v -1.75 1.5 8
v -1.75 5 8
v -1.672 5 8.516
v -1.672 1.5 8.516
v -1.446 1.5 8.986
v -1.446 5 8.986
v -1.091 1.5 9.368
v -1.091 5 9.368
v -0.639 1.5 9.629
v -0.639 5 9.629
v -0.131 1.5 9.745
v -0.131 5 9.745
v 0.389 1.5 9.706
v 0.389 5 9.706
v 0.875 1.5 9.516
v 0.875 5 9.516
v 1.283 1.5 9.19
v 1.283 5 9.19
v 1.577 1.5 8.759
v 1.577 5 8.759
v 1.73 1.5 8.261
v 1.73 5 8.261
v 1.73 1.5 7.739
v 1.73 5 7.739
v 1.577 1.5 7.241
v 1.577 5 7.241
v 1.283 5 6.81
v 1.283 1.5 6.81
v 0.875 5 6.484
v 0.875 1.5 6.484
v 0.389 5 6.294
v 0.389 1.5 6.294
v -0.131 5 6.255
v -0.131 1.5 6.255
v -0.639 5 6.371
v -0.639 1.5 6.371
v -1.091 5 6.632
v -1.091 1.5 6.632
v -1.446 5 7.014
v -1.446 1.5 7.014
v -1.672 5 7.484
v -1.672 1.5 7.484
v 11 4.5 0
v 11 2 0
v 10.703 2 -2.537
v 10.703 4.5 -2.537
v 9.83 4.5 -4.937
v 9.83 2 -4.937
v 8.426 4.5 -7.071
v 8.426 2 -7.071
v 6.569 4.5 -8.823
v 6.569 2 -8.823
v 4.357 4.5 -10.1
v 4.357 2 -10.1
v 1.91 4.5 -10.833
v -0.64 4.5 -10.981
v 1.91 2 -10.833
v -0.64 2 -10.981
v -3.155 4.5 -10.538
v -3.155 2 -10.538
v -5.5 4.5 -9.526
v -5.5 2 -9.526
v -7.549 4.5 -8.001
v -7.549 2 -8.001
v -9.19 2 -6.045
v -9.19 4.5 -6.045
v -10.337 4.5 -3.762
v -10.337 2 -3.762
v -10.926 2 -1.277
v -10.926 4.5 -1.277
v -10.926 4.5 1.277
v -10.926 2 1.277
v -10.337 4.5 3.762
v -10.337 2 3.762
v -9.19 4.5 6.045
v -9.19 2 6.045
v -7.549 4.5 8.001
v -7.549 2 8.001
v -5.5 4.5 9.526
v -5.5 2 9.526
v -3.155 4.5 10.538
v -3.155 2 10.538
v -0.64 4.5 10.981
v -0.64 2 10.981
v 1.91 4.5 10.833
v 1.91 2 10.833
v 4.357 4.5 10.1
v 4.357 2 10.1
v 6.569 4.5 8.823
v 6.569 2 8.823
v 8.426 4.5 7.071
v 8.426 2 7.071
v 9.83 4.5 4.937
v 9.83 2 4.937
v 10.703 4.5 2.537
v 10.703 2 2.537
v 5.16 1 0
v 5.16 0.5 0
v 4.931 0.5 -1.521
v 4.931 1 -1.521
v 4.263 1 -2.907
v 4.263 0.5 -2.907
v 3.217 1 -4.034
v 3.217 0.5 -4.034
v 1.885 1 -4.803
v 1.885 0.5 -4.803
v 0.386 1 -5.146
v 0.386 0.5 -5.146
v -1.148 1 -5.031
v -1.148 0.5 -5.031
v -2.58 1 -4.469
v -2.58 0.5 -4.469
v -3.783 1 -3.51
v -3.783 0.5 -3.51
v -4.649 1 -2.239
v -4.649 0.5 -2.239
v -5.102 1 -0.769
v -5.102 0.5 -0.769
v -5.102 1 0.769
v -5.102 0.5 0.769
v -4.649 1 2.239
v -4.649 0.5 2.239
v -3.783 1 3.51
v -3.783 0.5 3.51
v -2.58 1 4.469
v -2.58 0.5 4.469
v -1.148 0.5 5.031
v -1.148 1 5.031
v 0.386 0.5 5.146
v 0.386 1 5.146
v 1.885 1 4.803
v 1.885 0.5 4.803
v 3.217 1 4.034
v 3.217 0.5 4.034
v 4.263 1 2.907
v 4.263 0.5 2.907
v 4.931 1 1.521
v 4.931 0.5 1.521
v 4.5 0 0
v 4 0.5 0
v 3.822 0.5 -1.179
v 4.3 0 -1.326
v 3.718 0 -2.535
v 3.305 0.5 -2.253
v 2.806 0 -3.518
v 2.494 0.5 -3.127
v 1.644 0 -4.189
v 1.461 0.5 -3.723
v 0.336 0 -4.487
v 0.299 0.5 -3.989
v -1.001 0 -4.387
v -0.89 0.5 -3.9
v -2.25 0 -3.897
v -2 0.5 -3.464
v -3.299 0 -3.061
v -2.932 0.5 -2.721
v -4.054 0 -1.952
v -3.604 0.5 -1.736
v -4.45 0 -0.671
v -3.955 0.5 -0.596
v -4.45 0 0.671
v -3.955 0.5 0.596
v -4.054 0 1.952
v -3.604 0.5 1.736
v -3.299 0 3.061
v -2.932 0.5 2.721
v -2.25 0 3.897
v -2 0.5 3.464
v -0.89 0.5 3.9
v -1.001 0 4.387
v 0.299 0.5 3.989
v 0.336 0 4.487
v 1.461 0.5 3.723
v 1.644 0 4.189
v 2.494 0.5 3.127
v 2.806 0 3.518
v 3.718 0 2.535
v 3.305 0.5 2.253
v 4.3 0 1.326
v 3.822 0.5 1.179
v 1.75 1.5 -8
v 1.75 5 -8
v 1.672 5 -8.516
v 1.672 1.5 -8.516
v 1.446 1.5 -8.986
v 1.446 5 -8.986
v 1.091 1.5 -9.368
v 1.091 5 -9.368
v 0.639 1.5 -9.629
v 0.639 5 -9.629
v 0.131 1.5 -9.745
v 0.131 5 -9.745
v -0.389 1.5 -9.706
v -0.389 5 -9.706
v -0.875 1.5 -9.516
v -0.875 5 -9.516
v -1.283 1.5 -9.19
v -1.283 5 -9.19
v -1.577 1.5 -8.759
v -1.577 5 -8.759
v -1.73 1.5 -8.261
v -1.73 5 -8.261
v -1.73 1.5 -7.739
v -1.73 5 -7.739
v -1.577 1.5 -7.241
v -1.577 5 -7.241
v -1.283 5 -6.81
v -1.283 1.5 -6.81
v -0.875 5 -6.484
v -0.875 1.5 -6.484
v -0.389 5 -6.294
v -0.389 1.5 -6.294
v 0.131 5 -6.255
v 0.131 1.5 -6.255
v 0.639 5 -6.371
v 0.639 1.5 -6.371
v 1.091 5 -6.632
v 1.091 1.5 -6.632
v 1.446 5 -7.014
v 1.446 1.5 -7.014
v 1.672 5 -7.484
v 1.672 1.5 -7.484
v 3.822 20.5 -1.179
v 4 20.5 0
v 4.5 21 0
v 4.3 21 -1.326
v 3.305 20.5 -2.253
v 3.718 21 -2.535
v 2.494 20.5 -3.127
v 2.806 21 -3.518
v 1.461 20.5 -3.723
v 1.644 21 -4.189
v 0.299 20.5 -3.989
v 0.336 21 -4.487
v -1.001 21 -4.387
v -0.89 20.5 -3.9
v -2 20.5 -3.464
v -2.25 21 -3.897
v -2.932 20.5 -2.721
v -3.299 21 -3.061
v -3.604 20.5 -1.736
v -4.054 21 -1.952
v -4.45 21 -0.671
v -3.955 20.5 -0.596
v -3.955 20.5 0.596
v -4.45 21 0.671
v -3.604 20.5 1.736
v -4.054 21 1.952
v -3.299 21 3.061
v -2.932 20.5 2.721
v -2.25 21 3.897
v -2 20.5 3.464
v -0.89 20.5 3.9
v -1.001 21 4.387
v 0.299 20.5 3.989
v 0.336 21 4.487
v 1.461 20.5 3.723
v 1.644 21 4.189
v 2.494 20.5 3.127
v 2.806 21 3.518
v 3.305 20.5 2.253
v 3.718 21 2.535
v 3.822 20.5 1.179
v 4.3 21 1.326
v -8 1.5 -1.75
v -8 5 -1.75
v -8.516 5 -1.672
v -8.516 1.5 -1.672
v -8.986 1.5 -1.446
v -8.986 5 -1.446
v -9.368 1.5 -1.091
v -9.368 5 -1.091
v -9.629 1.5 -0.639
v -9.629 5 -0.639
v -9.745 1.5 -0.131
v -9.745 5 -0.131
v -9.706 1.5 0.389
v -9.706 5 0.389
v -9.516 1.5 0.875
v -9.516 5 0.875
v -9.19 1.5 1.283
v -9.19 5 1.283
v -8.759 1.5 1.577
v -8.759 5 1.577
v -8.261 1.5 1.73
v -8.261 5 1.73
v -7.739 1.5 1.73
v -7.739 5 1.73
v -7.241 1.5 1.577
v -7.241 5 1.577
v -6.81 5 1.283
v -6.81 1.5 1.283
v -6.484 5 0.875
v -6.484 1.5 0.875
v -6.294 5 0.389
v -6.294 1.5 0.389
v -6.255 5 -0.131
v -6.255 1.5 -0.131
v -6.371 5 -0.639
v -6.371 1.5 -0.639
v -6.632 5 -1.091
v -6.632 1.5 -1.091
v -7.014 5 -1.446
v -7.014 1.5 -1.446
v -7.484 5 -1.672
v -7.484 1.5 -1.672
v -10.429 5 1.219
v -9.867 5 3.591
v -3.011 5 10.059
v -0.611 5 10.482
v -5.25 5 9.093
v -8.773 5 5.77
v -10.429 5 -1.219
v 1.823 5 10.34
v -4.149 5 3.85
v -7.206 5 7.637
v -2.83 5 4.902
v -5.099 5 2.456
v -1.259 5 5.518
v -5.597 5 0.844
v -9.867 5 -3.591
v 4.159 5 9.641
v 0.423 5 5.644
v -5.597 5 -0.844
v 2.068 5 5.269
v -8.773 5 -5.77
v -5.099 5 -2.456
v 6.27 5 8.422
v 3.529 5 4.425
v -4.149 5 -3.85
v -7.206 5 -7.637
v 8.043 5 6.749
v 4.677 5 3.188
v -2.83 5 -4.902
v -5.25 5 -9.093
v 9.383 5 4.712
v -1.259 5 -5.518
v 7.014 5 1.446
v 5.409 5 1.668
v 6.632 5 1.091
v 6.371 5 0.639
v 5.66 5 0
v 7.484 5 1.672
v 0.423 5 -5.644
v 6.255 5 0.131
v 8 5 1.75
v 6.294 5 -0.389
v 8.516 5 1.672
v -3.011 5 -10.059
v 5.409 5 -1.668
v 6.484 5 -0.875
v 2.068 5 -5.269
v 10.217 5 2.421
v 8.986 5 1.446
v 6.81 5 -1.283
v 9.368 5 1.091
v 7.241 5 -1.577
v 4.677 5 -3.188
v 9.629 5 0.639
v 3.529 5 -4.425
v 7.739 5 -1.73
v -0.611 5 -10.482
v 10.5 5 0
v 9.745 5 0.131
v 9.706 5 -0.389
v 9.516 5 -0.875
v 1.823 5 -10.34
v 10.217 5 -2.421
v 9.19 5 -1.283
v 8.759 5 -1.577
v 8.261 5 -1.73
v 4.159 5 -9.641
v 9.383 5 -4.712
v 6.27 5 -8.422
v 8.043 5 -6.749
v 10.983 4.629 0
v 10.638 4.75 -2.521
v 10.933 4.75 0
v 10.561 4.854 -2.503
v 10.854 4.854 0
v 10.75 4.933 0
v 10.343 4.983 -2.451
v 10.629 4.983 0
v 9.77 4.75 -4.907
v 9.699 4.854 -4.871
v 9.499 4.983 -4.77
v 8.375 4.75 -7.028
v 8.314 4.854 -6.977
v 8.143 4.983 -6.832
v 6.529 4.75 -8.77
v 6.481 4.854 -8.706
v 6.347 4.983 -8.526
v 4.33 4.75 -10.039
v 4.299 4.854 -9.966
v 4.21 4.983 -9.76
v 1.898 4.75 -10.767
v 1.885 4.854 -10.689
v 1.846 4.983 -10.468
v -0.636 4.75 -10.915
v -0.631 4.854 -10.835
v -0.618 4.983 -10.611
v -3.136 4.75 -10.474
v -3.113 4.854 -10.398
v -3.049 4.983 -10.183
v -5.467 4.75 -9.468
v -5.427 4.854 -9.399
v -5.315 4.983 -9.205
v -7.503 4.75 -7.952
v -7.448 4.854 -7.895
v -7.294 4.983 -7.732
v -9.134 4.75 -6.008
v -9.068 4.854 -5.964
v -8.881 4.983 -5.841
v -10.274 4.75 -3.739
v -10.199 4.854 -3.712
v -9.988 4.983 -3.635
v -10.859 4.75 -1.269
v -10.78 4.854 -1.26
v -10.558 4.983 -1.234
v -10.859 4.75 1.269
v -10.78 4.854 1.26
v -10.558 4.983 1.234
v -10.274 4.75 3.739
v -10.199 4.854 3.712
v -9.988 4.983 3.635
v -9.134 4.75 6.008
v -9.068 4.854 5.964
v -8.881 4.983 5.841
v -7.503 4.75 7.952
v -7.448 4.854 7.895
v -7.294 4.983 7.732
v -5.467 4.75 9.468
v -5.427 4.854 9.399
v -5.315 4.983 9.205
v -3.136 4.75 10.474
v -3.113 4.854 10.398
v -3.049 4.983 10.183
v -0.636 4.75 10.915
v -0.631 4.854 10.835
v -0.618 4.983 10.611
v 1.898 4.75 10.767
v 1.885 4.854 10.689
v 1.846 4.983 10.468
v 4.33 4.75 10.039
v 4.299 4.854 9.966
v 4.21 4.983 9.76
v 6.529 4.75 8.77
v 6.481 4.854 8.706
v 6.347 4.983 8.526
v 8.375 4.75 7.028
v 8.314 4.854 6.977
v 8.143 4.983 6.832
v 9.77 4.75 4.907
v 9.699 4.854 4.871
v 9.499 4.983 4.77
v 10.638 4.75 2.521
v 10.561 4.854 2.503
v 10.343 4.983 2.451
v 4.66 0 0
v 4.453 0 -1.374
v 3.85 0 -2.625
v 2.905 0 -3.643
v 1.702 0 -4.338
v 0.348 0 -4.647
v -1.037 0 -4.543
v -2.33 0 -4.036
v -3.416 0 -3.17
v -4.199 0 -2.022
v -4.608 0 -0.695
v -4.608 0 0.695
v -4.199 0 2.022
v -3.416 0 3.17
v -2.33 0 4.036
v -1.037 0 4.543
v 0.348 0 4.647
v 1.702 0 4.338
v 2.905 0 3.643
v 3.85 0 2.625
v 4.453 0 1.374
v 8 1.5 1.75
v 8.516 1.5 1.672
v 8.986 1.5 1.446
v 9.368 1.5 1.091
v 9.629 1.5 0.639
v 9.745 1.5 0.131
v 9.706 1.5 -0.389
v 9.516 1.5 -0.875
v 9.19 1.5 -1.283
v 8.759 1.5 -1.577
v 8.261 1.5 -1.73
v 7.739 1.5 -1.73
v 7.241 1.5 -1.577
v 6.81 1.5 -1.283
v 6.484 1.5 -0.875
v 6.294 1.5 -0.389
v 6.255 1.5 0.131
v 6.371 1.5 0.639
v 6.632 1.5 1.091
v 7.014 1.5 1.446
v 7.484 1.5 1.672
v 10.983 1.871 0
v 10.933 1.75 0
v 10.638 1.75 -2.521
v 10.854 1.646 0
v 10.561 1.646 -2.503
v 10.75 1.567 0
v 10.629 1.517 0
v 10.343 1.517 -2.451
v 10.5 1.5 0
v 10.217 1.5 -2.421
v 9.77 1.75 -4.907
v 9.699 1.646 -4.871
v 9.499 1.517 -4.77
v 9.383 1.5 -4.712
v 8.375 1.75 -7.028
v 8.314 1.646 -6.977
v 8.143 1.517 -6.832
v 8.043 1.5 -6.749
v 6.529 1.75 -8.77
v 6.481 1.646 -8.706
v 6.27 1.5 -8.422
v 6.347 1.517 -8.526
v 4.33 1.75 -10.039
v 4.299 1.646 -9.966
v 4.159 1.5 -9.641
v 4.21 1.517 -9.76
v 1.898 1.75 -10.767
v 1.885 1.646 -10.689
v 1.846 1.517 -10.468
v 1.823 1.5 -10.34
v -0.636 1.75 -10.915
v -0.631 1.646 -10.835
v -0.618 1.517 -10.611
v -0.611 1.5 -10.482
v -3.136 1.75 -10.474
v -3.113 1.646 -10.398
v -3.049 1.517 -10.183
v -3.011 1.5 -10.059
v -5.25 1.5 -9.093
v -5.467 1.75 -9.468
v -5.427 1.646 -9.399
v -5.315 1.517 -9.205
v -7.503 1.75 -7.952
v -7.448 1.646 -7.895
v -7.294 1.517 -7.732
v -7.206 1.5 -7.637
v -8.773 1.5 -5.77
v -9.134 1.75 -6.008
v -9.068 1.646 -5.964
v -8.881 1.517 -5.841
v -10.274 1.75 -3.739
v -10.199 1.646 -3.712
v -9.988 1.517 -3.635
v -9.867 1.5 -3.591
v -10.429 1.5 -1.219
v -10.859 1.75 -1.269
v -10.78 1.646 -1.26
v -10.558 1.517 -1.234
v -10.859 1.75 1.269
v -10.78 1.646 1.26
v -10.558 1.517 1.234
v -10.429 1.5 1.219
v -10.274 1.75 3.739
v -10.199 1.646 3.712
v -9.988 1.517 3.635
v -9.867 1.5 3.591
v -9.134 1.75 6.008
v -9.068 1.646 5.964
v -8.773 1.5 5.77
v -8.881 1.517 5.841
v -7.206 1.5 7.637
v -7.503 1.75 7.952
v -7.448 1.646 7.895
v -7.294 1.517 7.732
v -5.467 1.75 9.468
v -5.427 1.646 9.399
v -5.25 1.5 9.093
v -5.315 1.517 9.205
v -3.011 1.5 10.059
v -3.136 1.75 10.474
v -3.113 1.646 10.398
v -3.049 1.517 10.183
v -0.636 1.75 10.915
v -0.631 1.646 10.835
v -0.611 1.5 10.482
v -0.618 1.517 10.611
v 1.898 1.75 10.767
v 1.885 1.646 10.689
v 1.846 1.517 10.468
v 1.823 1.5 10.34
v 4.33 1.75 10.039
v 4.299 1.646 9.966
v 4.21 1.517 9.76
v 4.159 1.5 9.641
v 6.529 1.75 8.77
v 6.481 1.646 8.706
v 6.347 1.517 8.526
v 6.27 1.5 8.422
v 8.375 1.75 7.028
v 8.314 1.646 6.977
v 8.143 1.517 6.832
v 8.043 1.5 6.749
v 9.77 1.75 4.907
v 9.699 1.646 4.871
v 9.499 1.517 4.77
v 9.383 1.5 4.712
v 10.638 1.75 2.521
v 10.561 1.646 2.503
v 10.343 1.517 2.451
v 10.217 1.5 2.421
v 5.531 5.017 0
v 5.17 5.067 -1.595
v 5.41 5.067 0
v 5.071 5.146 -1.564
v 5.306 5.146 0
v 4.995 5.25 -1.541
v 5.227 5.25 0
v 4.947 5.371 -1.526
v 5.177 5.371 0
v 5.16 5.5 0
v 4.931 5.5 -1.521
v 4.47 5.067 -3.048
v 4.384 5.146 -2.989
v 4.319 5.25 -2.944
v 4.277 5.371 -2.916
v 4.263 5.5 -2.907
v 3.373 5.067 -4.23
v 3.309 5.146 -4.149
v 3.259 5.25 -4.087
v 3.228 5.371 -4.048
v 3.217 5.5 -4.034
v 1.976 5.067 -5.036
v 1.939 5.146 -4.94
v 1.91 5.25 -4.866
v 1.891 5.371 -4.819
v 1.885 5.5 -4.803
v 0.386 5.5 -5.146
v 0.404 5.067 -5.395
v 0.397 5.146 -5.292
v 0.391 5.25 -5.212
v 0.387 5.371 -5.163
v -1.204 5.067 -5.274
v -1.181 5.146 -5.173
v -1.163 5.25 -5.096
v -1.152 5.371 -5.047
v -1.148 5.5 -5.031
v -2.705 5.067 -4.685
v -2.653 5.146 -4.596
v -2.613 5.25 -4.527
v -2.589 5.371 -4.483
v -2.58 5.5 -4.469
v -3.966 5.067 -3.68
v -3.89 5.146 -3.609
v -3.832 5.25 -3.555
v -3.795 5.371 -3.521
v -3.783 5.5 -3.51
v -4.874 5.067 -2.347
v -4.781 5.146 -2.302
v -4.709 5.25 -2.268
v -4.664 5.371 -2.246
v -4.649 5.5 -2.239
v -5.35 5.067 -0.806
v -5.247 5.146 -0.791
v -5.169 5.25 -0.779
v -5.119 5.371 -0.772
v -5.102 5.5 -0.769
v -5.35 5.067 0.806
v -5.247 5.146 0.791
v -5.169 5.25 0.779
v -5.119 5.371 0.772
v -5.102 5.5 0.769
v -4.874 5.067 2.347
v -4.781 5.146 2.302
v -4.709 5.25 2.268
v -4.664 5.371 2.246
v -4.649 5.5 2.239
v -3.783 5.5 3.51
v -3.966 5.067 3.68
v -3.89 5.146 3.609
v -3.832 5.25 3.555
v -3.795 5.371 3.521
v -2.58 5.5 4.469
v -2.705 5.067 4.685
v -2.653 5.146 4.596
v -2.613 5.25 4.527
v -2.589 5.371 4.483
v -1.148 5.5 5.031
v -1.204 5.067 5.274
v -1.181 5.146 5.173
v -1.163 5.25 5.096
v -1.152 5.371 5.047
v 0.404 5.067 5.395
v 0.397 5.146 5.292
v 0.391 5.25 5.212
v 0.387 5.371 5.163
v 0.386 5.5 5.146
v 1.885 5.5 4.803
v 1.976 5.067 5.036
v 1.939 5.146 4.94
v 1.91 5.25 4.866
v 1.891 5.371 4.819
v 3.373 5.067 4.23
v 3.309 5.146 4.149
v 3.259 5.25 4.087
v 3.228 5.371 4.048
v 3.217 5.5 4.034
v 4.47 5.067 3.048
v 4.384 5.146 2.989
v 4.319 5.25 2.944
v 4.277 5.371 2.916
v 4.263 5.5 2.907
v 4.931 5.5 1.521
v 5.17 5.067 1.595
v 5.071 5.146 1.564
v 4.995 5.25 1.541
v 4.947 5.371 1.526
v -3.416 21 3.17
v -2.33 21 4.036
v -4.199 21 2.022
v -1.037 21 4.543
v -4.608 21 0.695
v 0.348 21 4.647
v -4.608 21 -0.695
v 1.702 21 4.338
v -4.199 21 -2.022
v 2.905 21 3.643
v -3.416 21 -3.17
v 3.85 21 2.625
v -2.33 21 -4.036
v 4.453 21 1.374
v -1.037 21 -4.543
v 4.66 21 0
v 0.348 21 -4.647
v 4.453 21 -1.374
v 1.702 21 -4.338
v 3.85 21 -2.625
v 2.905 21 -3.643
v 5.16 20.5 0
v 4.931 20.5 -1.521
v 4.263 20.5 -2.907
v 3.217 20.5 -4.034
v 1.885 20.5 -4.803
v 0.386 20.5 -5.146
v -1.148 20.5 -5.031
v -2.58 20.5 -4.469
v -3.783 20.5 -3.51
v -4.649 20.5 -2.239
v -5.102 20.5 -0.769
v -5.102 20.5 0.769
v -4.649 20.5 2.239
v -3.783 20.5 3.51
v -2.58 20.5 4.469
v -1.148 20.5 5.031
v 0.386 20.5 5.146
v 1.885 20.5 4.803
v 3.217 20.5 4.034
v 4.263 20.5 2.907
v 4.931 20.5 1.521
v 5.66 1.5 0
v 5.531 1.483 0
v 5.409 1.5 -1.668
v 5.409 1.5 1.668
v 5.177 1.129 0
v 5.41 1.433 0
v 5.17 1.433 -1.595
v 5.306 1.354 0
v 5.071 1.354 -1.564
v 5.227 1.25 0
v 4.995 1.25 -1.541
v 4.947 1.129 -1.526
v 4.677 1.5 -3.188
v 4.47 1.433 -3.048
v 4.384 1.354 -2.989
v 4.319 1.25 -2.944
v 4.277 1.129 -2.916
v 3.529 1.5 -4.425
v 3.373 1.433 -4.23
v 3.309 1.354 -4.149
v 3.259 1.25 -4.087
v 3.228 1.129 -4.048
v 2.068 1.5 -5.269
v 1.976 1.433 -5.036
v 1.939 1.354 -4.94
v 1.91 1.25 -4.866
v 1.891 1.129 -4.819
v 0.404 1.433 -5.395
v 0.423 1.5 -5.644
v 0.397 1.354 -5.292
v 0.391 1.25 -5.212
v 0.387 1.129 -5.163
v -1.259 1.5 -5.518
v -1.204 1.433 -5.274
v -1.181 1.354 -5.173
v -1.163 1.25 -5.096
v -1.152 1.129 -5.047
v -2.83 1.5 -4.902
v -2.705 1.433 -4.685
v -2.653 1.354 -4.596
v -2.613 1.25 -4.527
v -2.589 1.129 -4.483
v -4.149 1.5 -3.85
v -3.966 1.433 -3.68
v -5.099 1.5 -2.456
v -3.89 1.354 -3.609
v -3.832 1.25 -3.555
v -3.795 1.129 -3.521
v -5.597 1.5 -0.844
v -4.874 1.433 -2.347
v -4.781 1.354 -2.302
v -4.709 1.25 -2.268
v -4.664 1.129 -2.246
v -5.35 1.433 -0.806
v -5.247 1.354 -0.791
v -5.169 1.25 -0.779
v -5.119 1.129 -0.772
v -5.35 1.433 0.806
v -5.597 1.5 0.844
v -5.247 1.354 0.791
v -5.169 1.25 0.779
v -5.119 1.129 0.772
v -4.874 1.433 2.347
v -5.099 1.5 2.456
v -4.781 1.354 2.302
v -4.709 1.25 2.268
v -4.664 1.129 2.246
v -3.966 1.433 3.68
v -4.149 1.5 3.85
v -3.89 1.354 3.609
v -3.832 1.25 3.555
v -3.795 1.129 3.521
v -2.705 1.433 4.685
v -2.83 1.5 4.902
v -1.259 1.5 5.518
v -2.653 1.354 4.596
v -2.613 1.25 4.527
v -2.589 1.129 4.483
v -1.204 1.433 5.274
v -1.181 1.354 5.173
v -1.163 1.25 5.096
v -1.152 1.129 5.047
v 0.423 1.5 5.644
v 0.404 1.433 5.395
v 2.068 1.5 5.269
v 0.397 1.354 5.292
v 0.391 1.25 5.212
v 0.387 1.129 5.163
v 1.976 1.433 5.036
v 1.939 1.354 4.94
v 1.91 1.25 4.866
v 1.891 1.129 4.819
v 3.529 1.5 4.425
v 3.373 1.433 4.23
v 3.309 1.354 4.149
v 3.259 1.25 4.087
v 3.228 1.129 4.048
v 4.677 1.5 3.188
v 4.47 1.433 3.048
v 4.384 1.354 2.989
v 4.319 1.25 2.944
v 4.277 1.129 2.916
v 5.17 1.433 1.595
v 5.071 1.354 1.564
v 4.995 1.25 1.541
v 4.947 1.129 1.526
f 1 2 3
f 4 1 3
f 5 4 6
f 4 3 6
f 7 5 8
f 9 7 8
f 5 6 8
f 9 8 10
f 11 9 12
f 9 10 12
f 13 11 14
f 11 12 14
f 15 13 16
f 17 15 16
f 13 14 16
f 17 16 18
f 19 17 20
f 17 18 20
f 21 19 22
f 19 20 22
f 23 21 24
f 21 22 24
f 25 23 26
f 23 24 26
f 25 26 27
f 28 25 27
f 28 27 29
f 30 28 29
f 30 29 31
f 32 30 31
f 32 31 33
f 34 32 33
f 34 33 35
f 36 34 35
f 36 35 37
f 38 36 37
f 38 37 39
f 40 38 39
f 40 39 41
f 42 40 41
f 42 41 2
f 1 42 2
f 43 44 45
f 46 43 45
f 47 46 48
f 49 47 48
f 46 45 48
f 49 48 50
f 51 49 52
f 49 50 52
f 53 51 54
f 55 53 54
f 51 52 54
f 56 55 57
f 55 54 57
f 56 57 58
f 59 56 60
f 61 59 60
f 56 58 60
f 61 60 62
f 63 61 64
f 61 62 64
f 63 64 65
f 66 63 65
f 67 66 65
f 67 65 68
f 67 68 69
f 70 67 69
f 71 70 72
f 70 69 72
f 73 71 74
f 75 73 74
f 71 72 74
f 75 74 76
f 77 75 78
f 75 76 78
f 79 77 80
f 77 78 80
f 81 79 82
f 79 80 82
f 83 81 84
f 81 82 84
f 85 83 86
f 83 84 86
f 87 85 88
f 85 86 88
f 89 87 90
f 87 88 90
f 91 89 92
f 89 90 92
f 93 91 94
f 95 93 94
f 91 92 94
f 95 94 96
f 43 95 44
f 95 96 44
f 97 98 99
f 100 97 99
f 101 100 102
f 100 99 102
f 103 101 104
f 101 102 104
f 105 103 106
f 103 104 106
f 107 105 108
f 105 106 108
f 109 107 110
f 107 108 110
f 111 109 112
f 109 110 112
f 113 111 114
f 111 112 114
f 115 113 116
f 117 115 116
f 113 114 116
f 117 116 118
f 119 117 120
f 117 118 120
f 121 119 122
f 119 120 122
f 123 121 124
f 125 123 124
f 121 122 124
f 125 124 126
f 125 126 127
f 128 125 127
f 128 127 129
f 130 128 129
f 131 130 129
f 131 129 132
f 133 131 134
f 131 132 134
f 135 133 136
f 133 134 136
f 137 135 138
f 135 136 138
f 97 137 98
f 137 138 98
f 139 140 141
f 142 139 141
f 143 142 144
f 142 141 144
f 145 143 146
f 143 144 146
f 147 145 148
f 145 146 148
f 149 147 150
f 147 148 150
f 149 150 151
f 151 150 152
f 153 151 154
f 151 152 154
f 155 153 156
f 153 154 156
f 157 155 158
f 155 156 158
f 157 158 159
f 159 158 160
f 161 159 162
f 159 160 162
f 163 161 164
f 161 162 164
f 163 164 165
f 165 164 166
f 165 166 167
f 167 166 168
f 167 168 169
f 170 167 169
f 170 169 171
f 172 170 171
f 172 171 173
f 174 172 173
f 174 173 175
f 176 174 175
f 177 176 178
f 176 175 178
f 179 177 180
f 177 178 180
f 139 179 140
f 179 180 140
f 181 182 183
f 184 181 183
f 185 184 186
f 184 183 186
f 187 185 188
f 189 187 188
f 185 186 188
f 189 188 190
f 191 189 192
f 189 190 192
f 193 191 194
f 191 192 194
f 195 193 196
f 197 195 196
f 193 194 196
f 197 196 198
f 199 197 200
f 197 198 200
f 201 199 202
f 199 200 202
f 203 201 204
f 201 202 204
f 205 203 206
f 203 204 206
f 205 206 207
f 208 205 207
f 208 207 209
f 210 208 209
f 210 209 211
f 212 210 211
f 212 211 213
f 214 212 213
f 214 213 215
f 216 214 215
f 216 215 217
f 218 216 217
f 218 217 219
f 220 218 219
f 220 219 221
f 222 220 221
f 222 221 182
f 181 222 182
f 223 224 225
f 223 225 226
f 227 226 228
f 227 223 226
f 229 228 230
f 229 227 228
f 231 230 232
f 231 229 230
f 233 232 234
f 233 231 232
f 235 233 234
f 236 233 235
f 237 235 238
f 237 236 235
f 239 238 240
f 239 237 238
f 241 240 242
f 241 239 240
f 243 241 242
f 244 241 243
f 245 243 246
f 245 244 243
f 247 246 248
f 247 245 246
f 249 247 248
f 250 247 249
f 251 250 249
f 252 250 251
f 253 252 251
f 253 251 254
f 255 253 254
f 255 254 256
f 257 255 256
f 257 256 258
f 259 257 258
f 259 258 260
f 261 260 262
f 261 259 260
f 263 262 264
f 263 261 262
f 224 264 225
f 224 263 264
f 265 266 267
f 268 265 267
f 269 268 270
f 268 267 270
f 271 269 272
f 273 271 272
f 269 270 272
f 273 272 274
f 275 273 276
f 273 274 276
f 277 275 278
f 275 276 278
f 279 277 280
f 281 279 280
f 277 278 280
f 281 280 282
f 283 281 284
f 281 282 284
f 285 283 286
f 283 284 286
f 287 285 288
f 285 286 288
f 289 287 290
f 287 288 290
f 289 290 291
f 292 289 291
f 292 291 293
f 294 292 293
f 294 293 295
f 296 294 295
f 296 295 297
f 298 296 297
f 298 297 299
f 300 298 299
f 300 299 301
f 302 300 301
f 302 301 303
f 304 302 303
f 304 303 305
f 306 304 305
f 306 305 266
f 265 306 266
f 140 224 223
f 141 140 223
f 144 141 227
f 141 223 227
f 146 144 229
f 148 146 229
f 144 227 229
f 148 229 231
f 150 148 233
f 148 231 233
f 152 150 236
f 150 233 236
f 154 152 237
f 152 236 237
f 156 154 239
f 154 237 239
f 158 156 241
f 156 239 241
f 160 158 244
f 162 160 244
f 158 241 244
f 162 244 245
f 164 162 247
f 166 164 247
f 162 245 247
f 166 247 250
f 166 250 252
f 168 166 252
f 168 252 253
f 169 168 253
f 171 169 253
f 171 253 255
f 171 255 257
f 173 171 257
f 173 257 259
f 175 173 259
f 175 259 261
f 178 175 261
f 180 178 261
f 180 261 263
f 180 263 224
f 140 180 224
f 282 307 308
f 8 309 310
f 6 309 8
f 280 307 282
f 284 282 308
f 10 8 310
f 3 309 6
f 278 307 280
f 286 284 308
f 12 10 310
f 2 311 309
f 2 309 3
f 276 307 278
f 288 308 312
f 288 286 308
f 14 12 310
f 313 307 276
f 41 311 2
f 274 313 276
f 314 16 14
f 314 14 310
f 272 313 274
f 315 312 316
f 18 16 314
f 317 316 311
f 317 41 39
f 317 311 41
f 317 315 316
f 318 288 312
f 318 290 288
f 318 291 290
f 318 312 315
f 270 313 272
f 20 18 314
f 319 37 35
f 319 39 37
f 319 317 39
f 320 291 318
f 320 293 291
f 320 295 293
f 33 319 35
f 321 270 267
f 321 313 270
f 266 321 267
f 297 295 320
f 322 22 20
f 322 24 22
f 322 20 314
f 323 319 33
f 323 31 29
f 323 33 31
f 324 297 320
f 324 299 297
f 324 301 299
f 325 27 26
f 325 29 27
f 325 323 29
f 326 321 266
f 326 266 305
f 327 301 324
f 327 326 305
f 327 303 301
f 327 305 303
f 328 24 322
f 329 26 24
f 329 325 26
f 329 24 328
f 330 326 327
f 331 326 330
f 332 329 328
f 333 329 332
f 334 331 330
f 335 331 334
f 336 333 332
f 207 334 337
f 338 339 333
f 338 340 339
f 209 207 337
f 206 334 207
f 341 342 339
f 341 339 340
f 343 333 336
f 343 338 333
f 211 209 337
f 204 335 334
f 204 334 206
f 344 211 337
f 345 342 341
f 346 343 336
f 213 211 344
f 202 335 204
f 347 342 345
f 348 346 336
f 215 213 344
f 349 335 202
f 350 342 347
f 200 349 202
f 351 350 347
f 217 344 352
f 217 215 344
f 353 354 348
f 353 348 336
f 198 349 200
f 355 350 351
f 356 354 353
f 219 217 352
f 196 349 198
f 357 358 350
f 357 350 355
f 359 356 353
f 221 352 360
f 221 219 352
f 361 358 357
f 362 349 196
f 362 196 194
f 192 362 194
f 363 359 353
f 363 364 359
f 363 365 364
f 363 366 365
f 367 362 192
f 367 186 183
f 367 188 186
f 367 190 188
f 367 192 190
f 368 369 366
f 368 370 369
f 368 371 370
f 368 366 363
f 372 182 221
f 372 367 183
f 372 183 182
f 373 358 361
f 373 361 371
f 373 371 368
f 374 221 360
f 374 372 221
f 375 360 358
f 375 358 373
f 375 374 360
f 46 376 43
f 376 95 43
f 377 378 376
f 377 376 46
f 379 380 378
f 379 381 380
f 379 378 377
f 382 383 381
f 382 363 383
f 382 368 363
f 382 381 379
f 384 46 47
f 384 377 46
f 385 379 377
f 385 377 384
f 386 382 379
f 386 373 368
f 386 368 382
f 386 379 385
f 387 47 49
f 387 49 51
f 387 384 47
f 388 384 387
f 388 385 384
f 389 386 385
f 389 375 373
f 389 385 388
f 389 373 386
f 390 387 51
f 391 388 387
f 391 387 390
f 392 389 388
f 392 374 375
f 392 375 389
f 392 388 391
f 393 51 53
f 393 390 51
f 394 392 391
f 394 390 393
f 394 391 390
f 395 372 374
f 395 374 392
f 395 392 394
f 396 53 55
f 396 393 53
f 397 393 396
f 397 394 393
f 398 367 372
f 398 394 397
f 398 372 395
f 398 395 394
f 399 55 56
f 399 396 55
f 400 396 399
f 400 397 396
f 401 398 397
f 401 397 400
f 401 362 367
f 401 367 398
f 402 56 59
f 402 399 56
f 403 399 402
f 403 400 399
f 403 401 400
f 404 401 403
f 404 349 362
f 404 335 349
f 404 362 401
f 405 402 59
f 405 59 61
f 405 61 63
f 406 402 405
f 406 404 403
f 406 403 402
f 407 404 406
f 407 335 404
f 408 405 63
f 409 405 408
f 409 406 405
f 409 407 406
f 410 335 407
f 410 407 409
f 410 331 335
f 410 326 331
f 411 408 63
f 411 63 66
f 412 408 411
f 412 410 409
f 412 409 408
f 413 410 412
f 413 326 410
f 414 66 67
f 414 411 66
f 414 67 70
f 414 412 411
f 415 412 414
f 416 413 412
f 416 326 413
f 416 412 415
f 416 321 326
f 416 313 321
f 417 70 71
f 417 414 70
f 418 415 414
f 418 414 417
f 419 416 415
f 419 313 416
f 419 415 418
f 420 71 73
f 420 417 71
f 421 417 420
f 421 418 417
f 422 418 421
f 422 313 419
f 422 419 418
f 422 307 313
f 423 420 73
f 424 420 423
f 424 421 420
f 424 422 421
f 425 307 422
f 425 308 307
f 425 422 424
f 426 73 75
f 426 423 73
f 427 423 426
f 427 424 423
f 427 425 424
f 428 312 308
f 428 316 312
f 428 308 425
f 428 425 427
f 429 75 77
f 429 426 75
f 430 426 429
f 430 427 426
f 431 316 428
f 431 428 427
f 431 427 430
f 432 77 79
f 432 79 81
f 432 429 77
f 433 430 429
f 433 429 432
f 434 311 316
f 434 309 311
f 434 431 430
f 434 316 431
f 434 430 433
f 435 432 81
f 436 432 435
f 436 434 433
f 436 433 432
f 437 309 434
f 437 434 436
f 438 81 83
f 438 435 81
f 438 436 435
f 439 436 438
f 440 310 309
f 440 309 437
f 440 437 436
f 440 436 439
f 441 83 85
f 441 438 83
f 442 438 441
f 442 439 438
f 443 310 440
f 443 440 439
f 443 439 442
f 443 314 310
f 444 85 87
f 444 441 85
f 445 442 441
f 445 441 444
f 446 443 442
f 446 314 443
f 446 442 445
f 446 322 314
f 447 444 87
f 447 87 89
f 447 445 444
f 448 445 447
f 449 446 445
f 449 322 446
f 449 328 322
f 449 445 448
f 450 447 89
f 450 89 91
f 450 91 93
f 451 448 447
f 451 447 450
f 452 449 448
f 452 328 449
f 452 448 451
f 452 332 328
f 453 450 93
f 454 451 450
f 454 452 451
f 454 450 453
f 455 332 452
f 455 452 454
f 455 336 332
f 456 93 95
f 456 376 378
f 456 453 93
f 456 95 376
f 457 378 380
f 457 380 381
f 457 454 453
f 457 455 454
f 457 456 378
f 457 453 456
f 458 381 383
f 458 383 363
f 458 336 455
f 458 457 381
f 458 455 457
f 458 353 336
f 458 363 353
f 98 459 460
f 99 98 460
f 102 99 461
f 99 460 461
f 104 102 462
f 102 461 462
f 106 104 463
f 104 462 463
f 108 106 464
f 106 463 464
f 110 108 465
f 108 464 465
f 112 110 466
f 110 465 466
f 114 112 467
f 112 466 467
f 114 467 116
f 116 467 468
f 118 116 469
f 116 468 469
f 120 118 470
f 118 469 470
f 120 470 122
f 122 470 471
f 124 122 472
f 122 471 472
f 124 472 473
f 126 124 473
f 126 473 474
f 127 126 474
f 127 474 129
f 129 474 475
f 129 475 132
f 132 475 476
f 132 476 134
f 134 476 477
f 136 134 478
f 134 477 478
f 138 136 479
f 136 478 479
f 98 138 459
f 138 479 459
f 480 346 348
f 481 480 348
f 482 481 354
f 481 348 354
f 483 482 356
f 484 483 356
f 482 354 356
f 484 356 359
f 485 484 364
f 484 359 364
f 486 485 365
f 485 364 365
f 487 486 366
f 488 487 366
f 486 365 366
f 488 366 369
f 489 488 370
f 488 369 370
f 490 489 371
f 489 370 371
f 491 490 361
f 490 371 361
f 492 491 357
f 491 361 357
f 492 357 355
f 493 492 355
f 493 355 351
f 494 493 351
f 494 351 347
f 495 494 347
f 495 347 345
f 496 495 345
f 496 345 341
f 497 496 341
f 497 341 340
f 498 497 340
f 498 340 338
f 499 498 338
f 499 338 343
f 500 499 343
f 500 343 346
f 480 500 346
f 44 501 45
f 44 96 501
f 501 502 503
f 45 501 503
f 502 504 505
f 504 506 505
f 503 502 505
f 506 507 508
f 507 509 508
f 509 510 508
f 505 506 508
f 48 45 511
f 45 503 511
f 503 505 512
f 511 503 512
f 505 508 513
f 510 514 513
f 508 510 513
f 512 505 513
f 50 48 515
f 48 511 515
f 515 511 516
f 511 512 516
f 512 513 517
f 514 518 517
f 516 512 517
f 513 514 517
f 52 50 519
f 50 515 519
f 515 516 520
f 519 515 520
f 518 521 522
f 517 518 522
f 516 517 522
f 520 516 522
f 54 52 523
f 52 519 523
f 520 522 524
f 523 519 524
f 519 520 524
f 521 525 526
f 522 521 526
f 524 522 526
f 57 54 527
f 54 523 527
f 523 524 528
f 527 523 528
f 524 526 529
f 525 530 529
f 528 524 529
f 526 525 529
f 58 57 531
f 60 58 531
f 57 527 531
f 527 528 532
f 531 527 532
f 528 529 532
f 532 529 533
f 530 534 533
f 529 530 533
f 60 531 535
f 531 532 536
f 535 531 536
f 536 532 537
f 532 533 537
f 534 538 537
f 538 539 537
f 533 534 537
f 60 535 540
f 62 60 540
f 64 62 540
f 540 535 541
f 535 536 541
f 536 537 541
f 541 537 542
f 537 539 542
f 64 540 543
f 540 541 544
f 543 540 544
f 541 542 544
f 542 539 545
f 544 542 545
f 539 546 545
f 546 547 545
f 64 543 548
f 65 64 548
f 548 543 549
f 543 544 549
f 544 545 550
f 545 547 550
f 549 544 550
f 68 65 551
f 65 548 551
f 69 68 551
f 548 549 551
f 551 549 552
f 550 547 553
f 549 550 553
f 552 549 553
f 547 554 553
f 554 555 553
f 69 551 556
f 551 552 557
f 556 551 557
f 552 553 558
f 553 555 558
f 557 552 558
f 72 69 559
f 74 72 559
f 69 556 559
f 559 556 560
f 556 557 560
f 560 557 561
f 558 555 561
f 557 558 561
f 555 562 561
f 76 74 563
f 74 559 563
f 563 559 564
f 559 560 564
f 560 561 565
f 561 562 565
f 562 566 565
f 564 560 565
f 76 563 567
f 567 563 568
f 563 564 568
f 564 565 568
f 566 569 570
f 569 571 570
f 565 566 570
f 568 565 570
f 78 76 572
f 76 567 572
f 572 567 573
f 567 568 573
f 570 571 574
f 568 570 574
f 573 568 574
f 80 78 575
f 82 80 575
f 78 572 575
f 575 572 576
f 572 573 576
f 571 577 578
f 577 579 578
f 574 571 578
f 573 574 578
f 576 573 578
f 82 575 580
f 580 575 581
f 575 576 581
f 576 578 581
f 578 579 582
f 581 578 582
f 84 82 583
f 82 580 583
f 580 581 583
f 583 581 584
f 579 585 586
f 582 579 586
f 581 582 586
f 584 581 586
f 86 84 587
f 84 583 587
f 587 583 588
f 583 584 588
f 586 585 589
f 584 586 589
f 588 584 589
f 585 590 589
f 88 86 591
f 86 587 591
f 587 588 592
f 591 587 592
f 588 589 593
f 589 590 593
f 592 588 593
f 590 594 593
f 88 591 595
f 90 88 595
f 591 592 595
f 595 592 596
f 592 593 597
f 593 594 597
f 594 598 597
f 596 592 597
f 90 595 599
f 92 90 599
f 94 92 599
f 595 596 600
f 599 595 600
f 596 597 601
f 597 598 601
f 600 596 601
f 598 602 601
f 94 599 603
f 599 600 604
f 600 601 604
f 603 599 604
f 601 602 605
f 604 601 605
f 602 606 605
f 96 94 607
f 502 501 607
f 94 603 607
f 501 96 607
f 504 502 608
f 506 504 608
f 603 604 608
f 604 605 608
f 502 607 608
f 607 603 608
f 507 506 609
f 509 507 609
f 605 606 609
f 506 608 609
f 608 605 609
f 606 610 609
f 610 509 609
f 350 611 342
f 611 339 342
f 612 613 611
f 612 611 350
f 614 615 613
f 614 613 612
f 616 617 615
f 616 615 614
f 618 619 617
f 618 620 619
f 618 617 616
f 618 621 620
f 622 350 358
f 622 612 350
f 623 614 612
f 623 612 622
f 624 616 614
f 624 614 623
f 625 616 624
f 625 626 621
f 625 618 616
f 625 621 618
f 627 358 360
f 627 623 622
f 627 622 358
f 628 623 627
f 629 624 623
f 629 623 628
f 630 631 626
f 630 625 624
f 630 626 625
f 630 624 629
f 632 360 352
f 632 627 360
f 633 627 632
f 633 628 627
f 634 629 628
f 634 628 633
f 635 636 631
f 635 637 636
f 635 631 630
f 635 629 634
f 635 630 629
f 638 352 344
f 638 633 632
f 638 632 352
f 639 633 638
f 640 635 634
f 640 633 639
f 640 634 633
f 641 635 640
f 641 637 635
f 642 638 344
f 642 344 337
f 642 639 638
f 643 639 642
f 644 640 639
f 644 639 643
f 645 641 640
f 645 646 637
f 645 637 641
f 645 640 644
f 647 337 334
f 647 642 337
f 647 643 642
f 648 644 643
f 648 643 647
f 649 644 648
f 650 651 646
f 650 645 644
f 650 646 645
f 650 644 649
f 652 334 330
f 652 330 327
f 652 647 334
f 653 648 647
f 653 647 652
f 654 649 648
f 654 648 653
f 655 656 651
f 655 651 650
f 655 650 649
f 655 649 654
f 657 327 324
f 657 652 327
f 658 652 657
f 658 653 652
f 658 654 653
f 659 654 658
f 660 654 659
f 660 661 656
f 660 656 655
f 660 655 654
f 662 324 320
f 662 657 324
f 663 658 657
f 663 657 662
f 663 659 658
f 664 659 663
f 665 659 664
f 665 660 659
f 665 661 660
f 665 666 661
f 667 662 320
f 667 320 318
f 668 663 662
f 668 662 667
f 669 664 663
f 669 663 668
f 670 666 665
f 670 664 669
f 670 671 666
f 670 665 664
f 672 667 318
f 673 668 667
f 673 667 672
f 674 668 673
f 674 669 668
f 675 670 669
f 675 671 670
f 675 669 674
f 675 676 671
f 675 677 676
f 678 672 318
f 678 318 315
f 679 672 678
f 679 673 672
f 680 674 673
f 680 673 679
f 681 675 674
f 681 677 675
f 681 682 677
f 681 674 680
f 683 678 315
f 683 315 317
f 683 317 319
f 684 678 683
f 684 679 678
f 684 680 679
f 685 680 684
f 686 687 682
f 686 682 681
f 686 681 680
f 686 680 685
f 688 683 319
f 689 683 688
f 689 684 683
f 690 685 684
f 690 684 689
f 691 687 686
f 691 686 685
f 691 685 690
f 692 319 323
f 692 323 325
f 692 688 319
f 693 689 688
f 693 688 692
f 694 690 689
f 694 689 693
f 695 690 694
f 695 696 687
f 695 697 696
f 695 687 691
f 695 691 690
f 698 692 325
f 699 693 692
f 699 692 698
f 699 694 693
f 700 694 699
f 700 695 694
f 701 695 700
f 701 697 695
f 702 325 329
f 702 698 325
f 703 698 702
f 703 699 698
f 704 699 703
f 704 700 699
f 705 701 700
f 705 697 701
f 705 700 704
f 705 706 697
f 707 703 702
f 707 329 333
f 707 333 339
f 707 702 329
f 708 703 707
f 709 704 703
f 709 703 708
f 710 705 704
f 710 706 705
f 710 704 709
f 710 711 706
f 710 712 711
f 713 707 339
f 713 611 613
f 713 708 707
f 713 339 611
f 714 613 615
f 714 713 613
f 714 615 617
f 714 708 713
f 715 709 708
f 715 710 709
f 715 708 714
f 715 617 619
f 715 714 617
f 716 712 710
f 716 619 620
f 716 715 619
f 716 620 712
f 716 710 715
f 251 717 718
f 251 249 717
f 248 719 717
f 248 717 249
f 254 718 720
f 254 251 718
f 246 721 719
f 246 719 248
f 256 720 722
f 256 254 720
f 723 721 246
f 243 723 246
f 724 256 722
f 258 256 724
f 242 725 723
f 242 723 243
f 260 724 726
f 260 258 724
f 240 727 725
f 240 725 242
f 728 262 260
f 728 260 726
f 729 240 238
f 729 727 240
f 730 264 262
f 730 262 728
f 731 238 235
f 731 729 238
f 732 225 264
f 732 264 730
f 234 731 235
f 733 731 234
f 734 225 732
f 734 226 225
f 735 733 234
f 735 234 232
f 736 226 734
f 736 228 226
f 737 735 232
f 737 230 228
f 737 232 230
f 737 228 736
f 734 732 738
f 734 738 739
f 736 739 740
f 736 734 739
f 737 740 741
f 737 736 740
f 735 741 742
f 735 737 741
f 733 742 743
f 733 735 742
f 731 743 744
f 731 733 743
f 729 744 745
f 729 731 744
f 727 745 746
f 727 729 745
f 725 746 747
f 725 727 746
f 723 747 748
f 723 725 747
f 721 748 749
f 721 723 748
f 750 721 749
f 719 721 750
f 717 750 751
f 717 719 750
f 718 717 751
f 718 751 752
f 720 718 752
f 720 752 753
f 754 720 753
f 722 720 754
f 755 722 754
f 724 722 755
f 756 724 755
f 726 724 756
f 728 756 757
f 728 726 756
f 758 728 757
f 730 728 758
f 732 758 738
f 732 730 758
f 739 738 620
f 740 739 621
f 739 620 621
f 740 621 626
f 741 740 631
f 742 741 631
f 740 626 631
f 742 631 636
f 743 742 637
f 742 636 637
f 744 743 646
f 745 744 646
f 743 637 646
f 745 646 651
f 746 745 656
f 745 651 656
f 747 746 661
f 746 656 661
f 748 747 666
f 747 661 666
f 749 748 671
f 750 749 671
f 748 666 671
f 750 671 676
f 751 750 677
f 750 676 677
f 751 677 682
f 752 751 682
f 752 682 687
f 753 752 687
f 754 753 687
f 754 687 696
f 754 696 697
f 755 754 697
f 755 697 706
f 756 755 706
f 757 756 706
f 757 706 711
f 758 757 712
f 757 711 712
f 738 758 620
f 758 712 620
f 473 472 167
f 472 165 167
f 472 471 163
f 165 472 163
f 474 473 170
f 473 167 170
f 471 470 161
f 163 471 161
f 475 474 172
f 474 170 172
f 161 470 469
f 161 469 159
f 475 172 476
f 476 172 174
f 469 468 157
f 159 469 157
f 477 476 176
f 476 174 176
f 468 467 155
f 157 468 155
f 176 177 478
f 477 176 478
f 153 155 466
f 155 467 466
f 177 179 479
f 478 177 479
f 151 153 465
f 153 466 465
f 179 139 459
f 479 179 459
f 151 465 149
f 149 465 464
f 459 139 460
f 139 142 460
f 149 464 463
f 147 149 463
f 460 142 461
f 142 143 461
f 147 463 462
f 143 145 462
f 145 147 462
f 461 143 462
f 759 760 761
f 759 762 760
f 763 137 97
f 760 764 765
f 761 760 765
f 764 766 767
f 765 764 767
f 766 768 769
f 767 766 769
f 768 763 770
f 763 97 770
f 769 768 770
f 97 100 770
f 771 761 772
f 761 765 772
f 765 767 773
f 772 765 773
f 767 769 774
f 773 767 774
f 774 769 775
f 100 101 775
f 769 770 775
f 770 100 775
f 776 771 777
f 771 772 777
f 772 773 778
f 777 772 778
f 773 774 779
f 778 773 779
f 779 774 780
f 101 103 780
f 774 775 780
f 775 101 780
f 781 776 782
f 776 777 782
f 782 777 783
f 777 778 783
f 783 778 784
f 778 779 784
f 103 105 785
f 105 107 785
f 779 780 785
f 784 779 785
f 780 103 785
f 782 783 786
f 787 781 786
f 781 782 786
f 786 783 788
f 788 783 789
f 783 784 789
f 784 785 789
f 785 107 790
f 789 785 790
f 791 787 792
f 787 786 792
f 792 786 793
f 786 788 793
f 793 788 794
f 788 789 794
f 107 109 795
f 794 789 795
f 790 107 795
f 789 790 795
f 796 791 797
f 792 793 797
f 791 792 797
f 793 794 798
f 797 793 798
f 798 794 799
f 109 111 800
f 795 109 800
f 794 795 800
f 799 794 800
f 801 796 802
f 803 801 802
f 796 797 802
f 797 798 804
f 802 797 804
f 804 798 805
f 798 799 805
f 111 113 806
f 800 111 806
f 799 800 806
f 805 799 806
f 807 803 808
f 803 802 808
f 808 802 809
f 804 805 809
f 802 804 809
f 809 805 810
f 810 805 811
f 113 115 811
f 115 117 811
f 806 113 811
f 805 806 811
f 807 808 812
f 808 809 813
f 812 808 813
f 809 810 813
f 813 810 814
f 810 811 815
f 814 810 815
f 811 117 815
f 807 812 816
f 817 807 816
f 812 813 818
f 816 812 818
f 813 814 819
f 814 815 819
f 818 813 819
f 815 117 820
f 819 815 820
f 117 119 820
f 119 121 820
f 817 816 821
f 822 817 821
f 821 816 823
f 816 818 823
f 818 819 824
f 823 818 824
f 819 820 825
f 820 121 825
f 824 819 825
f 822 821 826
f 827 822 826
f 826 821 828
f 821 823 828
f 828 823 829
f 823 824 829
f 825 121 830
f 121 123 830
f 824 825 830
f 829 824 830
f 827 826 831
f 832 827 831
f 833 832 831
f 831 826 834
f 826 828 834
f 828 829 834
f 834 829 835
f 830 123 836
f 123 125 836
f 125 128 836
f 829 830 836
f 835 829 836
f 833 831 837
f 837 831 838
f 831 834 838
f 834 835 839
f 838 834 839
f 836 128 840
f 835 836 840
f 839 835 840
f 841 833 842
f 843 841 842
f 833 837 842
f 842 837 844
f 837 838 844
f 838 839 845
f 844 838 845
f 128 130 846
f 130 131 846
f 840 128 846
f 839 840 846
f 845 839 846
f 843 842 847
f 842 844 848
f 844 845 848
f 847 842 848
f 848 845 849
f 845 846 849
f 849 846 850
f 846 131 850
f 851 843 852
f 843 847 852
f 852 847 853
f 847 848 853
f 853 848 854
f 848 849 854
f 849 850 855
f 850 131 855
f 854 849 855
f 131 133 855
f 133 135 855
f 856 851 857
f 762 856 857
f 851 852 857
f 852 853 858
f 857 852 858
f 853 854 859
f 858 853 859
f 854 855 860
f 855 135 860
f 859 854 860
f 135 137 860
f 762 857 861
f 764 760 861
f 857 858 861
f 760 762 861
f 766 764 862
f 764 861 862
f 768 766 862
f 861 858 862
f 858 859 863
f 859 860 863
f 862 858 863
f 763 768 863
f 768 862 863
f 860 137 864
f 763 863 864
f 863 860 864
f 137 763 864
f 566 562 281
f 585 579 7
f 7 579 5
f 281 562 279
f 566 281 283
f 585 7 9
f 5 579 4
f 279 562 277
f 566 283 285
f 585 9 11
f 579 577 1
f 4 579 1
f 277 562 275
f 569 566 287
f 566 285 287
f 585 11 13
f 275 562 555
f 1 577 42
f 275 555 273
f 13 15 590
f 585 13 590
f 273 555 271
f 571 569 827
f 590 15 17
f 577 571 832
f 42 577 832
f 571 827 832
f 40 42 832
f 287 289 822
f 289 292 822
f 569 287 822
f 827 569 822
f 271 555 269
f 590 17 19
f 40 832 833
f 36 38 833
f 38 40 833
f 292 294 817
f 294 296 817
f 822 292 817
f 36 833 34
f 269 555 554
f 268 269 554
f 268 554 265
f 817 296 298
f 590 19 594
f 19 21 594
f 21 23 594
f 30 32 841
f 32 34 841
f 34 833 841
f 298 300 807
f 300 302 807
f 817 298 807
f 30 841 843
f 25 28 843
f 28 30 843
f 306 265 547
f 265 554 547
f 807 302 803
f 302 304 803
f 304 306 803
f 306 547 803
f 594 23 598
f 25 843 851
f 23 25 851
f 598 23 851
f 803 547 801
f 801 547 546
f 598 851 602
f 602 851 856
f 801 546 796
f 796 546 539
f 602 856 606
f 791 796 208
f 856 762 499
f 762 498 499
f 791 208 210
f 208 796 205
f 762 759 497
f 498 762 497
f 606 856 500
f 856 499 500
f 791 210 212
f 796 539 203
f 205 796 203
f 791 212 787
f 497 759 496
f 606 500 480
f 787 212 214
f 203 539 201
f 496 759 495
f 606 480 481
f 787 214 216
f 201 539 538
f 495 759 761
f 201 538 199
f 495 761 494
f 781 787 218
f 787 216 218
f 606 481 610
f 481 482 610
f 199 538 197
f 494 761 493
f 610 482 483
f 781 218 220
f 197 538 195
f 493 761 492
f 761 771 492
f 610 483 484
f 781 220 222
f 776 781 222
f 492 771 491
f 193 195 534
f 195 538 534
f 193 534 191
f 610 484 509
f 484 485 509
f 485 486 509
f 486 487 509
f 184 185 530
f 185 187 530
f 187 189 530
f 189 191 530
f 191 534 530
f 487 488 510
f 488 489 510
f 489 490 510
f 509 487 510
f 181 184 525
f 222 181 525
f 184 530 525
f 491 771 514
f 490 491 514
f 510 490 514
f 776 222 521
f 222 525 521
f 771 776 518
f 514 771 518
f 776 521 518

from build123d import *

# Parameters (mm, degrees)
SKETCH1_R           = 5.16
BOSS_EXTRUDE1_DEPTH = 1.5
SKETCH2_R           = 11
BOSS_EXTRUDE2_DEPTH = 3.5
SKETCH3_R           = 5.16
BOSS_EXTRUDE3_DEPTH = 16
SKETCH4_R           = 4
CUT_EXTRUDE1_DEPTH  = 26
SKETCH5_R           = 1.75
CUT_EXTRUDE2_DEPTH  = 26
CIRPATTERN1_COUNT   = 4
FILLET1_R           = 0.5
CHAMFER1_SIZE       = 0.5


with BuildPart() as part:
    # Sketch1 → Boss-Extrude1 (new body)
    with BuildSketch(Plane(origin=(0, 0, 0), x_dir=(1, 0, 0), z_dir=(0, 1, 0))):
        Circle(SKETCH1_R)
    extrude(amount=BOSS_EXTRUDE1_DEPTH)

    # Sketch2 → Boss-Extrude2 (add)
    with BuildSketch(Plane(origin=(0, 1.5, 0), x_dir=(1, 0, 0), z_dir=(0, 1, 0))):
        Circle(SKETCH2_R)
    extrude(amount=BOSS_EXTRUDE2_DEPTH)

    # Sketch3 → Boss-Extrude3 (add)
    with BuildSketch(Plane(origin=(0, 5, 0), x_dir=(1, 0, 0), z_dir=(0, 1, 0))):
        Circle(SKETCH3_R)
    extrude(amount=BOSS_EXTRUDE3_DEPTH)

    # Sketch4 → Cut-Extrude1 (cut)
    with BuildSketch(Plane(origin=(0, 21, 0), x_dir=(1, 0, 0), z_dir=(0, 1, 0))):
        Circle(SKETCH4_R)
    extrude(amount=-CUT_EXTRUDE1_DEPTH, mode=Mode.SUBTRACT)

    # Sketch5 → Cut-Extrude2 (cut)
    with BuildSketch(Plane(origin=(0, 5, 0), x_dir=(1, 0, 0), z_dir=(0, 1, 0))):
        with Locations((0, 8)):
            Circle(SKETCH5_R)
    cut_extrude2 = extrude(amount=-CUT_EXTRUDE2_DEPTH, mode=Mode.SUBTRACT)

    # CirPattern1: Cut-Extrude2 ×4 about axis
    cirpattern1_axis = Axis((0, 0, 0), (0, 1, 0))
    for i in range(1, CIRPATTERN1_COUNT):
        add(cut_extrude2.rotate(cirpattern1_axis, i * 360 / CIRPATTERN1_COUNT), mode=Mode.SUBTRACT)

    # Fillet1
    fillet1_edges = [part.edges().sort_by_distance(p)[0] for p in [
        (-5.16, 1.5, 0),
        (-11, 1.5, 0),
        (-11, 5, 0),
        (-5.16, 5, 0),
    ]]
    fillet(fillet1_edges, radius=FILLET1_R)

    # Chamfer1
    chamfer1_edges = [part.edges().sort_by_distance(p)[0] for p in [
        (-5.16, 21, 0),
        (-4, 0, 0),
        (-4, 21, 0),
        (-5.16, 0, 0),
    ]]
    chamfer(chamfer1_edges, length=CHAMFER1_SIZE)


solid = part.part
